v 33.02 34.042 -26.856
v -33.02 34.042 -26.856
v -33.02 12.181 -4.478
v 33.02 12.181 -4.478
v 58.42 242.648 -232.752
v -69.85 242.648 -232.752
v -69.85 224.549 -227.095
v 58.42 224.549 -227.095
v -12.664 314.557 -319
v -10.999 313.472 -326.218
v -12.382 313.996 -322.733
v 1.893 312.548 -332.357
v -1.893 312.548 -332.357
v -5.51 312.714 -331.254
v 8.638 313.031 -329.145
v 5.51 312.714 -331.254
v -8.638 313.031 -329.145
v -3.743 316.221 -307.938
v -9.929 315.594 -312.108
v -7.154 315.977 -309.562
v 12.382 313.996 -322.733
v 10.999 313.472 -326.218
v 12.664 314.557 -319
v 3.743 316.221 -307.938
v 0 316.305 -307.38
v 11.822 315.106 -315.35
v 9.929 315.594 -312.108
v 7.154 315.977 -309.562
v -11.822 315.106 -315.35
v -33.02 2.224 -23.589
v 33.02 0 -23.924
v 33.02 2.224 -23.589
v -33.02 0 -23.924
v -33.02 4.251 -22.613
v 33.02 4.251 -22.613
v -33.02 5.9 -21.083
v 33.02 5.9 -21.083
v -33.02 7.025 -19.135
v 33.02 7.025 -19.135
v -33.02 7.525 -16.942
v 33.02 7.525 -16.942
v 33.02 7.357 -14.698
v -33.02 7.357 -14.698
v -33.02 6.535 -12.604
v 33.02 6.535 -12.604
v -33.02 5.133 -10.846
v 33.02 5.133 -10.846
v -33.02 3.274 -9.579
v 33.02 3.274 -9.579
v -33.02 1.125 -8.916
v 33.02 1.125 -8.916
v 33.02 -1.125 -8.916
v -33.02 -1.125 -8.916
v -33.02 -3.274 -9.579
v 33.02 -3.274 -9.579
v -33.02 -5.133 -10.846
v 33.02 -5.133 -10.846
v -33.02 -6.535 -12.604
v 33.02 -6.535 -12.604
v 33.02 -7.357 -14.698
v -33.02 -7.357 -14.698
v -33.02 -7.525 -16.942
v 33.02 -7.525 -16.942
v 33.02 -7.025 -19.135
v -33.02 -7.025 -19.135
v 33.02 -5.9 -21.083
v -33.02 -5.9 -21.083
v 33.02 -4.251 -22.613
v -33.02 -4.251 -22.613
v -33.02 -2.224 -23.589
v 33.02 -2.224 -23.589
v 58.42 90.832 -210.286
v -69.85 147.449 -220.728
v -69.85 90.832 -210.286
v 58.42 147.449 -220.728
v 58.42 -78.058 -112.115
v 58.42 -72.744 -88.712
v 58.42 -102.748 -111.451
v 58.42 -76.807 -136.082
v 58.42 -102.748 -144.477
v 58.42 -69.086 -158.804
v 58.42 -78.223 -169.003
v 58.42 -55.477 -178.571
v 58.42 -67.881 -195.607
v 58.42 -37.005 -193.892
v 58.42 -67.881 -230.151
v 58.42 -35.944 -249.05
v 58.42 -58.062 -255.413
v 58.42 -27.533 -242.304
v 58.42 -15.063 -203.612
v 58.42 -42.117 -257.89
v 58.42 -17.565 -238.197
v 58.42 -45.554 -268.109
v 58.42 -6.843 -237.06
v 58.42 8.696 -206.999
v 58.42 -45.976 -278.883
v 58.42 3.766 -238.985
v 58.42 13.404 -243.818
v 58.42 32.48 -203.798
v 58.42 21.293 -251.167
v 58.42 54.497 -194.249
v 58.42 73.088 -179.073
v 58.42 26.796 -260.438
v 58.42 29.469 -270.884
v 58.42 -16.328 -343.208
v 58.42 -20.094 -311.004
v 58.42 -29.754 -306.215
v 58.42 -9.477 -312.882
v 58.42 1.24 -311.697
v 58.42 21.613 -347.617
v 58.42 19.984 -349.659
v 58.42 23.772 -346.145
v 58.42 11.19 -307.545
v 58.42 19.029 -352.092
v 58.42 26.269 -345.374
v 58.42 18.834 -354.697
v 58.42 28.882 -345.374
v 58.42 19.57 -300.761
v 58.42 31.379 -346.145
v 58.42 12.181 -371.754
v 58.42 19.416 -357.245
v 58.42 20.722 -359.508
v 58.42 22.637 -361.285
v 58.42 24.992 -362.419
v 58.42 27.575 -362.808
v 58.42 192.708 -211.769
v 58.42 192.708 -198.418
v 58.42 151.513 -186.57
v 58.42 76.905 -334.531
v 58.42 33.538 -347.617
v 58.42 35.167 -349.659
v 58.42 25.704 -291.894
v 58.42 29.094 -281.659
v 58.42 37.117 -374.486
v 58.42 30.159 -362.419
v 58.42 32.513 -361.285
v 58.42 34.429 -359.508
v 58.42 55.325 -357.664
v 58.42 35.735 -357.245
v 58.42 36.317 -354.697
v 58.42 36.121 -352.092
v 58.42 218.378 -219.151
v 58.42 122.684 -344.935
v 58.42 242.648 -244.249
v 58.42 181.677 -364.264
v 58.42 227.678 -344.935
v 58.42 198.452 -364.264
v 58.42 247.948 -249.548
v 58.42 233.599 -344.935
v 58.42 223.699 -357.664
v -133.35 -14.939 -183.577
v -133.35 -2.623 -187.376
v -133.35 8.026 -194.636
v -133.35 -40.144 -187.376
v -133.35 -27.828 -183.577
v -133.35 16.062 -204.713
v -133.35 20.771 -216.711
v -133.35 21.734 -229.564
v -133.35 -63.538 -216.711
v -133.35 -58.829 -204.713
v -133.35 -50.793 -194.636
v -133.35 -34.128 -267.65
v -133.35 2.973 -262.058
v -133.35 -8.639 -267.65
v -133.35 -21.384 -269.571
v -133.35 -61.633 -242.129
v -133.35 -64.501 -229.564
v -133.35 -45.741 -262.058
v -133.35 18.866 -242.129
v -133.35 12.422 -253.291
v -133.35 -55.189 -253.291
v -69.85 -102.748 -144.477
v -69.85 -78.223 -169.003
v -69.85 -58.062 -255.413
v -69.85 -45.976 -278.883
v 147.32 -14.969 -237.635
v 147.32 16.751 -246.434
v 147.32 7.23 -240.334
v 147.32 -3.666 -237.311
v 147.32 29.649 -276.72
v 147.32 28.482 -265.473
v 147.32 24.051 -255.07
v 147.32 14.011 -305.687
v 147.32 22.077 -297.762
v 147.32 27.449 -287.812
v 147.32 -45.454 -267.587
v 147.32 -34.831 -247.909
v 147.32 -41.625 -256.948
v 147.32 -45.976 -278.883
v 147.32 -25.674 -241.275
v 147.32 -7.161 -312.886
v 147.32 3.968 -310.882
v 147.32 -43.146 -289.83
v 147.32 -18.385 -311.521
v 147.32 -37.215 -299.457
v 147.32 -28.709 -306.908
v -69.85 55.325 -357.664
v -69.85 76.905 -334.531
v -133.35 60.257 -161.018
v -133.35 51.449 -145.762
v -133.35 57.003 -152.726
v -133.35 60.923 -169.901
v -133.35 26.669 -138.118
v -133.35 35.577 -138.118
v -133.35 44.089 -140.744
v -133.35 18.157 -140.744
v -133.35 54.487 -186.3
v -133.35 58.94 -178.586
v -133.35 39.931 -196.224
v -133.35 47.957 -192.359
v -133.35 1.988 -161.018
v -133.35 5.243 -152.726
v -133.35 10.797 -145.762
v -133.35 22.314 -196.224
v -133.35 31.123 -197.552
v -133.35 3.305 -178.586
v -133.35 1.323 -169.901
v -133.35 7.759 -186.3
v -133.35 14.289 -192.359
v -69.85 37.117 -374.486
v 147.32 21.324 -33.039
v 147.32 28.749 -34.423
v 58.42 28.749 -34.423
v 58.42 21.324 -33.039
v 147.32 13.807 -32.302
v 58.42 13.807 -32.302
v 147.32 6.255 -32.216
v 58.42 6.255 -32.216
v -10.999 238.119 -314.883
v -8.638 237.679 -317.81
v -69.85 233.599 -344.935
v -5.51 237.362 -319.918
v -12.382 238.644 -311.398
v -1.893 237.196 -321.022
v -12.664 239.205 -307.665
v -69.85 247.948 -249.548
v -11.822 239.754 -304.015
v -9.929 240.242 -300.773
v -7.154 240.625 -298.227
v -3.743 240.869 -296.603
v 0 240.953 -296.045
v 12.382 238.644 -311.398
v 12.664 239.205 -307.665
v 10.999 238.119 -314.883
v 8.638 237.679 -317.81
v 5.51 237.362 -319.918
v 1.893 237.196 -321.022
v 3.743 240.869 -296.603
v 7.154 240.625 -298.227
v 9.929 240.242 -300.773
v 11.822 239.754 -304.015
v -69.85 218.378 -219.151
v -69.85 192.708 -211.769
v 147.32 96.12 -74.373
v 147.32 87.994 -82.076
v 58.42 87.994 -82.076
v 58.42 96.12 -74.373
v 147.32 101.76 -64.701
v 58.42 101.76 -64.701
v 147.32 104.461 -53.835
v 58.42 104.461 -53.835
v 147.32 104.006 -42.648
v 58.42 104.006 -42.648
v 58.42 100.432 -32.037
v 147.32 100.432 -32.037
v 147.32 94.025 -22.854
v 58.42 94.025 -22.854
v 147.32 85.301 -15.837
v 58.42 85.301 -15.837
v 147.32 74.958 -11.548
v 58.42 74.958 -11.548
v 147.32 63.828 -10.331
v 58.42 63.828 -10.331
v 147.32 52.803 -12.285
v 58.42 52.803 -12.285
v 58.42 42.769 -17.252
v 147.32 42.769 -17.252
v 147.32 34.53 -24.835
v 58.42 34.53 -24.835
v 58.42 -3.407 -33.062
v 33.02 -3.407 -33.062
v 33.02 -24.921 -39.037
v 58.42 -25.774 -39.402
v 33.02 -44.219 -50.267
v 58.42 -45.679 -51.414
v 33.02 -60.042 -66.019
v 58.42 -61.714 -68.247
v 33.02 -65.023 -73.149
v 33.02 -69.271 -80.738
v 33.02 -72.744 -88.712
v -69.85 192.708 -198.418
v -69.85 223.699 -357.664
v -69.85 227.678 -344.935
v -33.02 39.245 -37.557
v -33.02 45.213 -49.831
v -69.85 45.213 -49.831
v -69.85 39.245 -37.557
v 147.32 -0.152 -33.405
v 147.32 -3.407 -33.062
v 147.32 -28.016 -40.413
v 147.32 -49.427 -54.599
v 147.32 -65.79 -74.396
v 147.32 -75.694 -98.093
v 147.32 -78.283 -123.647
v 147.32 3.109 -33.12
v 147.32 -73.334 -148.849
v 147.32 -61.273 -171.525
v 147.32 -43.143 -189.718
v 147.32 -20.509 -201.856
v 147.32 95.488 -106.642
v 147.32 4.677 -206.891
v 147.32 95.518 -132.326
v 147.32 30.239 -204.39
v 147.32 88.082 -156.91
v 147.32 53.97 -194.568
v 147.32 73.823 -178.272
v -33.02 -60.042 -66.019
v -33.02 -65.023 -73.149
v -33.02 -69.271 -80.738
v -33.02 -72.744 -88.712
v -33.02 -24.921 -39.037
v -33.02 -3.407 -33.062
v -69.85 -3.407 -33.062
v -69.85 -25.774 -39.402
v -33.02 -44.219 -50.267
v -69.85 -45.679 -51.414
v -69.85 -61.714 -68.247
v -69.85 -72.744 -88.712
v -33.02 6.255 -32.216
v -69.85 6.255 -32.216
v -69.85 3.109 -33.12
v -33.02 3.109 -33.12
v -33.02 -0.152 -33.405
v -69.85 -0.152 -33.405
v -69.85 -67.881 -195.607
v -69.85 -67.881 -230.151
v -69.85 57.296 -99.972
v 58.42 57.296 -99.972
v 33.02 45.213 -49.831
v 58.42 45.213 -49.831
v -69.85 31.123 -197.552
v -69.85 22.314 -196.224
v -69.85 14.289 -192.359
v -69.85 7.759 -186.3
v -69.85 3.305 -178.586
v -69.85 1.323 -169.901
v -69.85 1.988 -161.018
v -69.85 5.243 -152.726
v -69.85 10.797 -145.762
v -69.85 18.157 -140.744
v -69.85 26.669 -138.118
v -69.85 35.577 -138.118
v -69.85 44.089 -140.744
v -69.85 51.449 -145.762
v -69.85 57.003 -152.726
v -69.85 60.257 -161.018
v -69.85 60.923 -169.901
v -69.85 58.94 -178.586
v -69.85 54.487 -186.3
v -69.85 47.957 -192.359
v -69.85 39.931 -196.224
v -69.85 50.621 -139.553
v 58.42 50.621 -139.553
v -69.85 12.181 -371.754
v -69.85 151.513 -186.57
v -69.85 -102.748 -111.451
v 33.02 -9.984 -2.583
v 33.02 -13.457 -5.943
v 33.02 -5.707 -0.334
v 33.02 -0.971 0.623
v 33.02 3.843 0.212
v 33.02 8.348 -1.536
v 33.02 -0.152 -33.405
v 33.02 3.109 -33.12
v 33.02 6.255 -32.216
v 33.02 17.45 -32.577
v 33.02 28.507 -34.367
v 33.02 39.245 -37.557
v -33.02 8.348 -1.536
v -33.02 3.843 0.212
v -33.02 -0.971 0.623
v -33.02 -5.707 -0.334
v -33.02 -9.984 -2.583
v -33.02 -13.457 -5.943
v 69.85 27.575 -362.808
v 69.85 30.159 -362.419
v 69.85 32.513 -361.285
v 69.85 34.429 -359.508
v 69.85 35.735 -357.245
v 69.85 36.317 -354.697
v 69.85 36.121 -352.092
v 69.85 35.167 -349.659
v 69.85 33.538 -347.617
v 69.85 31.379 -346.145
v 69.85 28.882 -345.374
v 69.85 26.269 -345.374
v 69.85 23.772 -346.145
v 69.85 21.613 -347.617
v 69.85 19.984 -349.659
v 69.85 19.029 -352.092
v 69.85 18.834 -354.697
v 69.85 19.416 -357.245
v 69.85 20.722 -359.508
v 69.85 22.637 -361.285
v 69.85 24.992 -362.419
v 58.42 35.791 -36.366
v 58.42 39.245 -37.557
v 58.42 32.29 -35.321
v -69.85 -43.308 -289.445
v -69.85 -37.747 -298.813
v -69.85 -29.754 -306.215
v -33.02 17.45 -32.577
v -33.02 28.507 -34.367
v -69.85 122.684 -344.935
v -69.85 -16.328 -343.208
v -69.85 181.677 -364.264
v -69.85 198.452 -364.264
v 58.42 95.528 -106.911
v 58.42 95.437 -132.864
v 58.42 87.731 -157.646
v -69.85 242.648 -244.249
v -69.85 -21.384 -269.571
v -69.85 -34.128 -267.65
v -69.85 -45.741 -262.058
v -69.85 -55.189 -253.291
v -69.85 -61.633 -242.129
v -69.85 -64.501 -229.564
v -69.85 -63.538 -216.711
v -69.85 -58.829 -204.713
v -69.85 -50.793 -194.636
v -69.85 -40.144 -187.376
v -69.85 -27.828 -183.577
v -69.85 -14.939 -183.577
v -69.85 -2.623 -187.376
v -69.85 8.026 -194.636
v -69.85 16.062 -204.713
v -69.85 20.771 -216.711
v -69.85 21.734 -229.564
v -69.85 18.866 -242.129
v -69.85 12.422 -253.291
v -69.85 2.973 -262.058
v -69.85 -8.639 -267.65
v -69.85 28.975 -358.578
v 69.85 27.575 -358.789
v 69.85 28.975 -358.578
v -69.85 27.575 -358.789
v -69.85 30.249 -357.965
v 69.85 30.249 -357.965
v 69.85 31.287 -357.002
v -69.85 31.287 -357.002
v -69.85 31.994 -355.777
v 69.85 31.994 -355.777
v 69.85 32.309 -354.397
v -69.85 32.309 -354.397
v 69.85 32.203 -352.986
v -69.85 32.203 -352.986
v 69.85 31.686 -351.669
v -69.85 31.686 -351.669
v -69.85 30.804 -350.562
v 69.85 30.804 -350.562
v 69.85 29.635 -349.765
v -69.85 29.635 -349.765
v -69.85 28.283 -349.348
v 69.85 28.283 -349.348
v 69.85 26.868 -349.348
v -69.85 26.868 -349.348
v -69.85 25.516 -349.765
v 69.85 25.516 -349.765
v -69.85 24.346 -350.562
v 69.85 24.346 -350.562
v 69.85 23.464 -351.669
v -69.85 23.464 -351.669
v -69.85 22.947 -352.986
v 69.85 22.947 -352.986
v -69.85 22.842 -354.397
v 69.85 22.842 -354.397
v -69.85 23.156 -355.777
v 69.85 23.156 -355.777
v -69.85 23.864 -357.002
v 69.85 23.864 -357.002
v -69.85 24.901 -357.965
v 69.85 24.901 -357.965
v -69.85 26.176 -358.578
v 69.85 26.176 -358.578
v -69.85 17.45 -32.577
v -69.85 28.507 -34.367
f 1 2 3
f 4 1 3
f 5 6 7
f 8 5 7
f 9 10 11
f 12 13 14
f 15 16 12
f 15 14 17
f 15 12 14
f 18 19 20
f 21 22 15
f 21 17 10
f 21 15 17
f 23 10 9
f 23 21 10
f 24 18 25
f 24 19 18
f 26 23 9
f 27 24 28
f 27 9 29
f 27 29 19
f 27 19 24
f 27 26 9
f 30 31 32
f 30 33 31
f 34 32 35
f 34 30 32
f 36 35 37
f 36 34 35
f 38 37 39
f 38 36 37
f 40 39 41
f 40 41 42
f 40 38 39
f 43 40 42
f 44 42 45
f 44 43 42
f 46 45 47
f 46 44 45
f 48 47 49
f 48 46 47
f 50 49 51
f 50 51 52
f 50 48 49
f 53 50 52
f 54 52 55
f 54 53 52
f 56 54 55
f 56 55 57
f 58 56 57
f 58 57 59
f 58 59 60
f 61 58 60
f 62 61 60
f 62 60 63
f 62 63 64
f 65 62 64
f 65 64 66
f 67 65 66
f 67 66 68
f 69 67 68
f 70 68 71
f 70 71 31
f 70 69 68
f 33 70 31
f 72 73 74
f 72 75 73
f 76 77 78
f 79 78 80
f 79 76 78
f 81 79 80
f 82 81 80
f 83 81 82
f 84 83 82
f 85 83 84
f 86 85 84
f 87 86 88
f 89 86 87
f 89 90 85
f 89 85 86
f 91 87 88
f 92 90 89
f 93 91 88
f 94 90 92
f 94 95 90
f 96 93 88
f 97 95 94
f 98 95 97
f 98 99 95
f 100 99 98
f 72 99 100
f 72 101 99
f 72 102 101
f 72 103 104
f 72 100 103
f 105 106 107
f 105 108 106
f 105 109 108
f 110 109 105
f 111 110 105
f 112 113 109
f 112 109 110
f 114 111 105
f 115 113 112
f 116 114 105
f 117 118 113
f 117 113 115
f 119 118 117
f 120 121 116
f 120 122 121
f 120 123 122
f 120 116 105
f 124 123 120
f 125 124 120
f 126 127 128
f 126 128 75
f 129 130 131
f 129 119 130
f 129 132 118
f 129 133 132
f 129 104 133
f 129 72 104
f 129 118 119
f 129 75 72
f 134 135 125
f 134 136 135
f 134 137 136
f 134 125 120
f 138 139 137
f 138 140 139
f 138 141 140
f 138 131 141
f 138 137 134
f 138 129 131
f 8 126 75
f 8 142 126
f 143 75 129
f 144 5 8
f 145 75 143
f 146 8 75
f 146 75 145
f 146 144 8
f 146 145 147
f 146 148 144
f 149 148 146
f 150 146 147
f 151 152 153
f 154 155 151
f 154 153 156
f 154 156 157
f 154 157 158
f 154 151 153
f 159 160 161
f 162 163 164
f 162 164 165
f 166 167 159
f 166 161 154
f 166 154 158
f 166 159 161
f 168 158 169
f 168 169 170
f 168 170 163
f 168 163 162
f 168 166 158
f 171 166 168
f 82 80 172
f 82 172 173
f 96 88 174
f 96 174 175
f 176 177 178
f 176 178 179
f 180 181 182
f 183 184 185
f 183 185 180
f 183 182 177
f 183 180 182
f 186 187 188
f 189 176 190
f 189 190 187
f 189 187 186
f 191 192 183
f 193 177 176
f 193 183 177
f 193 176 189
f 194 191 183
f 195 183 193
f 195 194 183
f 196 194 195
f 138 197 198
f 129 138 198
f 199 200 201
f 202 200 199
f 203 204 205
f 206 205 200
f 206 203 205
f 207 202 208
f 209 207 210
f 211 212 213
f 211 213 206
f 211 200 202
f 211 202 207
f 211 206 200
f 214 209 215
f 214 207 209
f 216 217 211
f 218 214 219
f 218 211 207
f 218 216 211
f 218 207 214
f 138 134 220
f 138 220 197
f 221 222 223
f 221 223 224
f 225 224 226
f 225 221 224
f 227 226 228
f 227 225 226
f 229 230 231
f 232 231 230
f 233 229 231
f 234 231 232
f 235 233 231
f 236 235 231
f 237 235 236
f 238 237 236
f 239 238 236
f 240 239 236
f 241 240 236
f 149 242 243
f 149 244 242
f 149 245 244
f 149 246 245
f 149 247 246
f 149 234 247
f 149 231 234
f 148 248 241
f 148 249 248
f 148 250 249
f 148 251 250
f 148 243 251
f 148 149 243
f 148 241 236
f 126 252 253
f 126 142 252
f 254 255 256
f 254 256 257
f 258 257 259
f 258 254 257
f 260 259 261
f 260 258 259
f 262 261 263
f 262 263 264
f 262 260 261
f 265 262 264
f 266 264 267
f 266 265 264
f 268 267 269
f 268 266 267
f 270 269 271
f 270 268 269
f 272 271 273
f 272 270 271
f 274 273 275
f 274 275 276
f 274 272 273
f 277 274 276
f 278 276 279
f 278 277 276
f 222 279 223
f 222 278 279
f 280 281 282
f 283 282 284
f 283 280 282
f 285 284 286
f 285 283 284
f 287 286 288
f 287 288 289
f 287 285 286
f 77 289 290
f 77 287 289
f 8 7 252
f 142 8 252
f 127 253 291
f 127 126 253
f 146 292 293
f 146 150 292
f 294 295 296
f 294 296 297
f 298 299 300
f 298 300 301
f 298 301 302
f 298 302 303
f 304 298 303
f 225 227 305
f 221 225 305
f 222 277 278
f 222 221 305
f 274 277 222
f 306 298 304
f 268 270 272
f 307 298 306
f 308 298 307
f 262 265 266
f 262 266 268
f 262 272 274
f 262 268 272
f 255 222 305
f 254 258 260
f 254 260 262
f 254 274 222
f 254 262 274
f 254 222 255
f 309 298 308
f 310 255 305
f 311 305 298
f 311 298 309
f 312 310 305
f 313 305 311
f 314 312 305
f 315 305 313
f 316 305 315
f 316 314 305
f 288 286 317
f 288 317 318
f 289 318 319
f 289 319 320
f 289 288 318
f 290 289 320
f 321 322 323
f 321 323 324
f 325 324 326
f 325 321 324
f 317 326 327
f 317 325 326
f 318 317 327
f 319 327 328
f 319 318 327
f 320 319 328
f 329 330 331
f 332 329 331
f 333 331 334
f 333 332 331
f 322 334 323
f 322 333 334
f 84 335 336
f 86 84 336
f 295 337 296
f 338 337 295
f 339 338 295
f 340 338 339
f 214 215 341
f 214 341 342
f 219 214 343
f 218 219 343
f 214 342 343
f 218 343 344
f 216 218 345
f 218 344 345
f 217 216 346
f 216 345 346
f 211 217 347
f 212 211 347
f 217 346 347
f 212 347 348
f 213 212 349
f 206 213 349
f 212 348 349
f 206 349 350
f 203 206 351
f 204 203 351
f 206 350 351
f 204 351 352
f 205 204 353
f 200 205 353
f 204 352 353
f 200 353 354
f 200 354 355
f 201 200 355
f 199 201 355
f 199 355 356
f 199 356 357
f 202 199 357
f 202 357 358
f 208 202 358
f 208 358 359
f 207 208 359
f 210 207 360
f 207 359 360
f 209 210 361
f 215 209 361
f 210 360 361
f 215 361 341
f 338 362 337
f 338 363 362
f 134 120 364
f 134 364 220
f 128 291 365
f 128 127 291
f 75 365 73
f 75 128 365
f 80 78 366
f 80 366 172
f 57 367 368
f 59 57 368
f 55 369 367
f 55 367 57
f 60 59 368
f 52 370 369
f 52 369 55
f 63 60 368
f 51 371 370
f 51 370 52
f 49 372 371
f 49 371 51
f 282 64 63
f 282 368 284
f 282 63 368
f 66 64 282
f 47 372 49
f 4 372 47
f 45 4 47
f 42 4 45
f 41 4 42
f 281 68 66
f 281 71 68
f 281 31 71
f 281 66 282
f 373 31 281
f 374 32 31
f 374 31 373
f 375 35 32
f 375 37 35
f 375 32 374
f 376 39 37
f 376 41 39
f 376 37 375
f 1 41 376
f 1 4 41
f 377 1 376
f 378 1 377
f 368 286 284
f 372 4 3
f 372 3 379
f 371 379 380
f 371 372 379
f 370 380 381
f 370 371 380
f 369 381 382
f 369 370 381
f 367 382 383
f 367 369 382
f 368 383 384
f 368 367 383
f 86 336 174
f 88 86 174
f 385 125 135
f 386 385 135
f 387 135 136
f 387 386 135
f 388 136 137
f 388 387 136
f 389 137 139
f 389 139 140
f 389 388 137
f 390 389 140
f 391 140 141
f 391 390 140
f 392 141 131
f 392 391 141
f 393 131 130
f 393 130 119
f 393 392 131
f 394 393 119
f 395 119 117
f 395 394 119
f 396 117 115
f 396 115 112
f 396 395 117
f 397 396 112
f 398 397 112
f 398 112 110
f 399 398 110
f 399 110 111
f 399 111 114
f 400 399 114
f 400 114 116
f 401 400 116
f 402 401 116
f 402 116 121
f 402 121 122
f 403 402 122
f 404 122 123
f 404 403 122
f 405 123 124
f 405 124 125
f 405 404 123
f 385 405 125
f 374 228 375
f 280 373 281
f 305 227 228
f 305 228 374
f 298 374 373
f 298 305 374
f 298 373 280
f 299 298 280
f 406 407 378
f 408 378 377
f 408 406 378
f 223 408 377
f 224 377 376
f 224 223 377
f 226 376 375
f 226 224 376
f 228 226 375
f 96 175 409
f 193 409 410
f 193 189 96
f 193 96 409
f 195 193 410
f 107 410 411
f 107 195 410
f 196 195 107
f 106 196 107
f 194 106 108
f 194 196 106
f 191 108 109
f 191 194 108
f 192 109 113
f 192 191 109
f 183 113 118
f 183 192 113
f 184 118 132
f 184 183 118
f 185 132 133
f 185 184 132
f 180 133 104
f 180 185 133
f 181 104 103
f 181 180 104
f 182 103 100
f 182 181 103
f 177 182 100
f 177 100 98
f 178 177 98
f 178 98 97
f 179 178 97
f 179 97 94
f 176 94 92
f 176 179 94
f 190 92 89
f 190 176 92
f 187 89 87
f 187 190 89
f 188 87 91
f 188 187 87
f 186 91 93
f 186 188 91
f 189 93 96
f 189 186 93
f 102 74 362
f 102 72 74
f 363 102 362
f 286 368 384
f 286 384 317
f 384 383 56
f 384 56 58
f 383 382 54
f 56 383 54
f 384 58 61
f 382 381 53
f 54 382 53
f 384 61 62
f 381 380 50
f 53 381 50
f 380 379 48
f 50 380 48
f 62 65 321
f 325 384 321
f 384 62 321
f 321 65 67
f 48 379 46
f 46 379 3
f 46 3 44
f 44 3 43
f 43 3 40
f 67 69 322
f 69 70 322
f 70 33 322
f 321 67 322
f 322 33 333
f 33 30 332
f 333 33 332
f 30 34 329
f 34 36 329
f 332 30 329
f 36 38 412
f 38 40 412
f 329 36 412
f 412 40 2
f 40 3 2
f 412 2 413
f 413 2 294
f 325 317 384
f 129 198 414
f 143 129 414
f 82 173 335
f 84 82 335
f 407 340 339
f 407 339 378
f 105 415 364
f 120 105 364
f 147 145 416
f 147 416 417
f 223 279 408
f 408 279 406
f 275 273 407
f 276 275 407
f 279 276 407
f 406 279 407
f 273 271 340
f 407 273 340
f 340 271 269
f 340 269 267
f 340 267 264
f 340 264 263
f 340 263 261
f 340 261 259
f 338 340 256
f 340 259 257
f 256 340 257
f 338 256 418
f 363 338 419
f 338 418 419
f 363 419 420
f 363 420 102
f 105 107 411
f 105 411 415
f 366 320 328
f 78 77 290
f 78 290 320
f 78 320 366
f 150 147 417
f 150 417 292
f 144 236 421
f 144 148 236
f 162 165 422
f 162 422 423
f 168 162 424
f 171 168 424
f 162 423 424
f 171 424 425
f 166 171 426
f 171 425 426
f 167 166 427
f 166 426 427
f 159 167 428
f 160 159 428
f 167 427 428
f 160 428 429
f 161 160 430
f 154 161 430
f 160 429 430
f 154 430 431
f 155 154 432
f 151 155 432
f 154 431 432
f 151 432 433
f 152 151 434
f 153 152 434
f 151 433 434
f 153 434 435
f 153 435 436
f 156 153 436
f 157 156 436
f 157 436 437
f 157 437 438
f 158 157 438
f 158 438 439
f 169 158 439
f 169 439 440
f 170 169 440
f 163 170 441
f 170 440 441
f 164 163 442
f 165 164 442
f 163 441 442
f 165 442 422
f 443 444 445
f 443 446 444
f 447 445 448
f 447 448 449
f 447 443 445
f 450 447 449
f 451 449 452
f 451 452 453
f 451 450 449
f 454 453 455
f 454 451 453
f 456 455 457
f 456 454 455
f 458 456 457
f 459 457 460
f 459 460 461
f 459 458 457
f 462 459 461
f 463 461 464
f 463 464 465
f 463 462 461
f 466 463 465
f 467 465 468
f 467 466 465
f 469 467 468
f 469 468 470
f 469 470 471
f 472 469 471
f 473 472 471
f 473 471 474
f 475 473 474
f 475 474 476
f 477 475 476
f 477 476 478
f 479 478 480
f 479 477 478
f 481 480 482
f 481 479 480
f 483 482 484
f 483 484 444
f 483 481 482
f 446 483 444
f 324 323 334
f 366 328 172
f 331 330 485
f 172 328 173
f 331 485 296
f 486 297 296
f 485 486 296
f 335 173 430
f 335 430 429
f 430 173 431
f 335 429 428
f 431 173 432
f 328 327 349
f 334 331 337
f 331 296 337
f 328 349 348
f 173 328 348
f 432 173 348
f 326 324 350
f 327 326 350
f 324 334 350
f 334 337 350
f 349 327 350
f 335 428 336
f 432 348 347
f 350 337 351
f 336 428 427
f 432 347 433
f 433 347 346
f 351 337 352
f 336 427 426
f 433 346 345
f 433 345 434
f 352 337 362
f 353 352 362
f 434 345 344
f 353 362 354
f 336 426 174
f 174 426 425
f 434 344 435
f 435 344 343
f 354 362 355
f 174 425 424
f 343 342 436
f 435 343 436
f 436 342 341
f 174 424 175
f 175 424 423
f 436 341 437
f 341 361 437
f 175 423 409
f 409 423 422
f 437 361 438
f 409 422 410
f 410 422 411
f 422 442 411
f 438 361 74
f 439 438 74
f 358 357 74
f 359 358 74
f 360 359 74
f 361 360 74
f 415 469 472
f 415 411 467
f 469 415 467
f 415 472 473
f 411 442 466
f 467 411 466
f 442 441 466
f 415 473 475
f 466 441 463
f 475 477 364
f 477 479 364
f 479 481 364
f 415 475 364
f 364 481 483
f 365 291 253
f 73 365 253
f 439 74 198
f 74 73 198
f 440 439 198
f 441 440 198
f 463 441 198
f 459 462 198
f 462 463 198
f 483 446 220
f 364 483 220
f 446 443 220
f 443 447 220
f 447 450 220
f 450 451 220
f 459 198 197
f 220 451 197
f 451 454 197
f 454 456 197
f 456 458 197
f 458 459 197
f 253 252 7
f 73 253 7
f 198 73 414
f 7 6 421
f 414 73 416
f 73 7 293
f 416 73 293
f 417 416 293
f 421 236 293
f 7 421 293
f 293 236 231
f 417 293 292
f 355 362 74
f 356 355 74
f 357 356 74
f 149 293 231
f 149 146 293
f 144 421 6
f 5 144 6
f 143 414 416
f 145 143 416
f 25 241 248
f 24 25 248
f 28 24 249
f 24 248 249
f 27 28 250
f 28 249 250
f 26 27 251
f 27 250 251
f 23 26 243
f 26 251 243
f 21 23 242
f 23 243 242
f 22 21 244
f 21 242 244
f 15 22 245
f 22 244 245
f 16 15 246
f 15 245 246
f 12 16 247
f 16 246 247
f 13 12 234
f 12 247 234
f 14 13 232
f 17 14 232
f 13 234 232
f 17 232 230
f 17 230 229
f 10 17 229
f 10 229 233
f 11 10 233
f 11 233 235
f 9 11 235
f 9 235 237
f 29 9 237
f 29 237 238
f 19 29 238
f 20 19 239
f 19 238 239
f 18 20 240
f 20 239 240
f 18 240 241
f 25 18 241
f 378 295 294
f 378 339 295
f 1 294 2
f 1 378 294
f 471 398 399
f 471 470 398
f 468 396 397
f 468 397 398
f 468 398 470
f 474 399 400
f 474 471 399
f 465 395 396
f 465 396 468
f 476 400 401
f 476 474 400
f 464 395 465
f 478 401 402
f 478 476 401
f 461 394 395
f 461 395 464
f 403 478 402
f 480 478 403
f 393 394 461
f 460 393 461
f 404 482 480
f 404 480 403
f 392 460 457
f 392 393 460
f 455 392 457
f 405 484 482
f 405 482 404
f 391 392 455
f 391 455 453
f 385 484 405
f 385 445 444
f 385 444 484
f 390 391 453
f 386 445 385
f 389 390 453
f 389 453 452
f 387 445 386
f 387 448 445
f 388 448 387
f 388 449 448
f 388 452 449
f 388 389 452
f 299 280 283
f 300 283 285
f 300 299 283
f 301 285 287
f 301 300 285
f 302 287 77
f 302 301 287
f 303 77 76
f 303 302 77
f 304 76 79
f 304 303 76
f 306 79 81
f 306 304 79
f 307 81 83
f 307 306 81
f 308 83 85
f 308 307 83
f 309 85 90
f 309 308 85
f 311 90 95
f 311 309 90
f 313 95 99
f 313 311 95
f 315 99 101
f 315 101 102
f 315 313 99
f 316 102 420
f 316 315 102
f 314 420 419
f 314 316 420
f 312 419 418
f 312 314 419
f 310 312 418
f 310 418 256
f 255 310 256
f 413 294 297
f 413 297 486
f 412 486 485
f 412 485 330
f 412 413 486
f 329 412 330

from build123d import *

# Parameters (mm, degrees)
SKETCH3_R           = 8.765690973
SKETCH3_R_2         = 7.546329472
BOSS_EXTRUDE1_DEPTH = 33.02
SKETCH3_3_R         = 8.765690973
SKETCH3_3_R_2       = 4.747089374
BOSS_EXTRUDE2_DEPTH = 69.85
BOSS_EXTRUDE3_START = 58.42
SKETCH3_4_R         = 8.765690973
BOSS_EXTRUDE3_DEPTH = 25.4
BOSS_EXTRUDE4_START = 147.32
SKETCH3_5_R         = 37.933984784
BOSS_EXTRUDE4_DEPTH = 88.9
BOSS_EXTRUDE5_START = -33.02
SKETCH3_6_R         = 8.765690973
BOSS_EXTRUDE5_DEPTH = 36.83
SKETCH4_R           = 29.883477217
SKETCH4_R_2         = 43.238390789
BOSS_EXTRUDE6_DEPTH = 63.5
SKETCH5_R           = 12.7
BOSS_EXTRUDE7_DEPTH = 76.2


with BuildPart() as part:
    # Sketch3 → Boss-Extrude1 (new, symmetric)
    with BuildSketch(Plane(origin=(0, 0, 0), x_dir=(0, 0, -1), z_dir=(1, 0, 0))):
        with BuildLine():
            Line((26.855598623, 34.04153134), (4.47810231, 12.180709193))
            ThreePointArc((4.47810231, 12.180709193), (-0.623125102, -0.971268934), (5.942795811, -13.456689726))
            Line((5.942795811, -13.456689726), (66.019432644, -60.042158643))
            ThreePointArc((66.019432644, -60.042158643), (76.890934177, -67.24165573), (88.712417559, -72.743912948))
            Line((88.712417559, -72.743912948), (111.45096516, -102.748262935))
            Line((111.45096516, -102.748262935), (144.477083252, -102.748262935))
            Line((144.477083252, -102.748262935), (169.002654574, -78.222691613))
            Line((169.002654574, -78.222691613), (195.607463956, -67.881296304))
            Line((195.607463956, -67.881296304), (230.151439421, -67.881296304))
            Line((230.151439421, -67.881296304), (255.413307952, -58.06190745))
            Line((255.413307952, -58.06190745), (278.88283078, -45.976265865))
            ThreePointArc((278.88283078, -45.976265865), (294.32962444, -40.865539072), (306.21453812, -29.753753007))
            Line((306.21453812, -29.753753007), (343.20837466, -16.328313428))
            Line((343.20837466, -16.328313428), (371.754392863, 12.180709193))
            Line((371.754392863, 12.180709193), (374.485546232, 37.116975937))
            Line((374.485546232, 37.116975937), (357.663762198, 55.324665065))
            Line((357.663762198, 55.324665065), (334.531136252, 76.90543329))
            Line((334.531136252, 76.90543329), (344.934785387, 122.683933603))
            Line((344.934785387, 122.683933603), (364.263564291, 181.676846378))
            Line((364.263564291, 181.676846378), (364.263564291, 198.452389962))
            Line((364.263564291, 198.452389962), (357.663762198, 223.699422208))
            Line((357.663762198, 223.699422208), (344.934785387, 227.677887566))
            Line((344.934785387, 227.677887566), (344.934785387, 233.598698071))
            Line((344.934785387, 233.598698071), (249.548191735, 247.947506817))
            Line((249.548191735, 247.947506817), (244.248903474, 242.648218557))
            Line((244.248903474, 242.648218557), (232.751756038, 242.648218557))
            Line((232.751756038, 242.648218557), (227.094867147, 224.549177586))
            Line((227.094867147, 224.549177586), (219.151380314, 218.377908492))
            Line((219.151380314, 218.377908492), (211.768889899, 192.707825641))
            Line((211.768889899, 192.707825641), (198.41781103, 192.707825641))
            Line((198.41781103, 192.707825641), (186.570468216, 151.512747216))
            Line((186.570468216, 151.512747216), (220.727605993, 147.448698974))
            Line((220.727605993, 147.448698974), (210.286236359, 90.83239142))
            Line((210.286236359, 90.83239142), (139.553233817, 50.621163948))
            Line((139.553233817, 50.621163948), (99.972286673, 57.295598172))
            Line((99.972286673, 57.295598172), (49.830851017, 45.21297855))
            Line((49.830851017, 45.21297855), (26.855598623, 34.04153134))
        make_face()
        with Locations((354.042271494, 27.57532186)):
            Circle(SKETCH3_R, mode=Mode.SUBTRACT)
        with Locations((16.377571024, 0)):
            Circle(SKETCH3_R_2, mode=Mode.SUBTRACT)
    extrude(amount=BOSS_EXTRUDE1_DEPTH, both=True)



with BuildPart() as body_2:
    # Sketch3<3> → Boss-Extrude2 (new, symmetric)
    with BuildSketch(Plane(origin=(0, 0, 0), x_dir=(0, 0, -1), z_dir=(1, 0, 0))):
        with Locations((354.042271494, 27.57532186)):
            Circle(SKETCH3_3_R)
        with Locations((354.042271494, 27.57532186)):
            Circle(SKETCH3_3_R_2, mode=Mode.SUBTRACT)
    extrude(amount=BOSS_EXTRUDE2_DEPTH, both=True)


with BuildPart() as part_1:
    add(part.part)

    add(body_2.part)  # Boss-Extrude3 merges body 2
    # Sketch3<4> → Boss-Extrude3 (add)
    with BuildSketch(Plane(origin=(0, 0, 0), x_dir=(0, 0, -1), z_dir=(1, 0, 0)).offset(BOSS_EXTRUDE3_START)):
        with BuildLine():
            ThreePointArc((32.215659867, 6.254756105), (33.341085724, 1.485328635), (33.061654594, -3.407108386))
            ThreePointArc((33.061654594, -3.407108386), (51.413629646, -45.679009257), (88.712417559, -72.743912948))
            Line((88.712417559, -72.743912948), (111.45096516, -102.748262935))
            Line((111.45096516, -102.748262935), (144.477083252, -102.748262935))
            Line((144.477083252, -102.748262935), (169.002654574, -78.222691613))
            Line((169.002654574, -78.222691613), (195.607463956, -67.881296304))
            Line((195.607463956, -67.881296304), (230.151439421, -67.881296304))
            Line((230.151439421, -67.881296304), (255.413307952, -58.06190745))
            Line((255.413307952, -58.06190745), (278.88283078, -45.976265865))
            ThreePointArc((278.88283078, -45.976265865), (294.32962444, -40.865539072), (306.21453812, -29.753753007))
            Line((306.21453812, -29.753753007), (343.20837466, -16.328313428))
            Line((343.20837466, -16.328313428), (371.754392863, 12.180709193))
            Line((371.754392863, 12.180709193), (374.485546232, 37.116975937))
            Line((374.485546232, 37.116975937), (357.663762198, 55.324665065))
            Line((357.663762198, 55.324665065), (334.531136252, 76.90543329))
            Line((334.531136252, 76.90543329), (344.934785387, 122.683933603))
            Line((344.934785387, 122.683933603), (364.263564291, 181.676846378))
            Line((364.263564291, 181.676846378), (364.263564291, 198.452389962))
            Line((364.263564291, 198.452389962), (357.663762198, 223.699422208))
            Line((357.663762198, 223.699422208), (344.934785387, 227.677887566))
            Line((344.934785387, 227.677887566), (344.934785387, 233.598698071))
            Line((344.934785387, 233.598698071), (249.548191735, 247.947506817))
            Line((249.548191735, 247.947506817), (244.248903474, 242.648218557))
            Line((244.248903474, 242.648218557), (232.751756038, 242.648218557))
            Line((232.751756038, 242.648218557), (227.094867147, 224.549177586))
            Line((227.094867147, 224.549177586), (219.151380314, 218.377908492))
            Line((219.151380314, 218.377908492), (211.768889899, 192.707825641))
            Line((211.768889899, 192.707825641), (198.41781103, 192.707825641))
            Line((198.41781103, 192.707825641), (186.570468216, 151.512747216))
            Line((186.570468216, 151.512747216), (220.727605993, 147.448698974))
            Line((220.727605993, 147.448698974), (210.286236359, 90.83239142))
            Line((210.286236359, 90.83239142), (139.553233817, 50.621163948))
            Line((139.553233817, 50.621163948), (99.972286673, 57.295598172))
            Line((99.972286673, 57.295598172), (49.830851017, 45.21297855))
            Line((49.830851017, 45.21297855), (37.556768138, 39.2448496))
            ThreePointArc((37.556768138, 39.2448496), (33.294973494, 23.007425276), (32.215659867, 6.254756105))
        make_face()
        with Locations((354.042271494, 27.57532186)):
            Circle(SKETCH3_4_R, mode=Mode.SUBTRACT)
    extrude(amount=-BOSS_EXTRUDE3_DEPTH)

    # Sketch3<5> → Boss-Extrude4 (add)
    with BuildSketch(Plane(origin=(0, 0, 0), x_dir=(0, 0, -1), z_dir=(1, 0, 0)).offset(BOSS_EXTRUDE4_START)):
        with BuildLine():
            ThreePointArc((82.075918233, 87.994388044), (19.03494718, 89.912772519), (34.422828639, 28.74858909))
            ThreePointArc((34.422828639, 28.74858909), (32.589179891, 17.57330891), (32.215659867, 6.254756105))
            ThreePointArc((32.215659867, 6.254756105), (33.341085724, 1.485328635), (33.061654594, -3.407108386))
            ThreePointArc((33.061654594, -3.407108386), (196.622426511, -32.27419595), (82.075918233, 87.994388044))
        make_face()
        with Locations(Location((274.967874889, -8.24484233, 0), (0, 0, 275.923726861))):
            Circle(SKETCH3_5_R)
    extrude(amount=-BOSS_EXTRUDE4_DEPTH)

    # Sketch3<6> → Boss-Extrude5 (add)
    with BuildSketch(Plane(origin=(0, 0, 0), x_dir=(0, 0, -1), z_dir=(1, 0, 0)).offset(BOSS_EXTRUDE5_START)):
        with BuildLine():
            ThreePointArc((32.215659867, 6.254756105), (33.341085724, 1.485328635), (33.061654594, -3.407108386))
            ThreePointArc((33.061654594, -3.407108386), (51.413629646, -45.679009257), (88.712417559, -72.743912948))
            Line((88.712417559, -72.743912948), (111.45096516, -102.748262935))
            Line((111.45096516, -102.748262935), (144.477083252, -102.748262935))
            Line((144.477083252, -102.748262935), (169.002654574, -78.222691613))
            Line((169.002654574, -78.222691613), (195.607463956, -67.881296304))
            Line((195.607463956, -67.881296304), (230.151439421, -67.881296304))
            Line((230.151439421, -67.881296304), (255.413307952, -58.06190745))
            Line((255.413307952, -58.06190745), (278.88283078, -45.976265865))
            ThreePointArc((278.88283078, -45.976265865), (294.32962444, -40.865539072), (306.21453812, -29.753753007))
            Line((306.21453812, -29.753753007), (343.20837466, -16.328313428))
            Line((343.20837466, -16.328313428), (371.754392863, 12.180709193))
            Line((371.754392863, 12.180709193), (374.485546232, 37.116975937))
            Line((374.485546232, 37.116975937), (357.663762198, 55.324665065))
            Line((357.663762198, 55.324665065), (334.531136252, 76.90543329))
            Line((334.531136252, 76.90543329), (344.934785387, 122.683933603))
            Line((344.934785387, 122.683933603), (364.263564291, 181.676846378))
            Line((364.263564291, 181.676846378), (364.263564291, 198.452389962))
            Line((364.263564291, 198.452389962), (357.663762198, 223.699422208))
            Line((357.663762198, 223.699422208), (344.934785387, 227.677887566))
            Line((344.934785387, 227.677887566), (344.934785387, 233.598698071))
            Line((344.934785387, 233.598698071), (249.548191735, 247.947506817))
            Line((249.548191735, 247.947506817), (244.248903474, 242.648218557))
            Line((244.248903474, 242.648218557), (232.751756038, 242.648218557))
            Line((232.751756038, 242.648218557), (227.094867147, 224.549177586))
            Line((227.094867147, 224.549177586), (219.151380314, 218.377908492))
            Line((219.151380314, 218.377908492), (211.768889899, 192.707825641))
            Line((211.768889899, 192.707825641), (198.41781103, 192.707825641))
            Line((198.41781103, 192.707825641), (186.570468216, 151.512747216))
            Line((186.570468216, 151.512747216), (220.727605993, 147.448698974))
            Line((220.727605993, 147.448698974), (210.286236359, 90.83239142))
            Line((210.286236359, 90.83239142), (139.553233817, 50.621163948))
            Line((139.553233817, 50.621163948), (99.972286673, 57.295598172))
            Line((99.972286673, 57.295598172), (49.830851017, 45.21297855))
            Line((49.830851017, 45.21297855), (37.556768138, 39.2448496))
            ThreePointArc((37.556768138, 39.2448496), (33.294973494, 23.007425276), (32.215659867, 6.254756105))
        make_face()
        with Locations((354.042271494, 27.57532186)):
            Circle(SKETCH3_6_R, mode=Mode.SUBTRACT)
    extrude(amount=-BOSS_EXTRUDE5_DEPTH)

    # Sketch4 → Boss-Extrude6 (add)
    with BuildSketch(Plane.ZY.offset(69.85)):
        with Locations(Location((-167.668024488, 31.122707437, 0), (0, 0, 180))):
            Circle(SKETCH4_R)
        with Locations(Location((-226.332433107, -21.383558841, 0), (0, 0, 180))):
            Circle(SKETCH4_R_2)
    extrude(amount=BOSS_EXTRUDE6_DEPTH)

    # Sketch5 → Boss-Extrude7 (add)
    with BuildSketch(Plane(origin=(0, 279.169325886, -41.994866484), x_dir=(1, 0, 0), z_dir=(0, 0.9888741863075109, -0.1487543063398786))):
        with Locations(Location((0, 269.608209436, 0), (0, 0, 270))):
            Circle(SKETCH5_R)
    extrude(amount=BOSS_EXTRUDE7_DEPTH)


solid = part_1.part
